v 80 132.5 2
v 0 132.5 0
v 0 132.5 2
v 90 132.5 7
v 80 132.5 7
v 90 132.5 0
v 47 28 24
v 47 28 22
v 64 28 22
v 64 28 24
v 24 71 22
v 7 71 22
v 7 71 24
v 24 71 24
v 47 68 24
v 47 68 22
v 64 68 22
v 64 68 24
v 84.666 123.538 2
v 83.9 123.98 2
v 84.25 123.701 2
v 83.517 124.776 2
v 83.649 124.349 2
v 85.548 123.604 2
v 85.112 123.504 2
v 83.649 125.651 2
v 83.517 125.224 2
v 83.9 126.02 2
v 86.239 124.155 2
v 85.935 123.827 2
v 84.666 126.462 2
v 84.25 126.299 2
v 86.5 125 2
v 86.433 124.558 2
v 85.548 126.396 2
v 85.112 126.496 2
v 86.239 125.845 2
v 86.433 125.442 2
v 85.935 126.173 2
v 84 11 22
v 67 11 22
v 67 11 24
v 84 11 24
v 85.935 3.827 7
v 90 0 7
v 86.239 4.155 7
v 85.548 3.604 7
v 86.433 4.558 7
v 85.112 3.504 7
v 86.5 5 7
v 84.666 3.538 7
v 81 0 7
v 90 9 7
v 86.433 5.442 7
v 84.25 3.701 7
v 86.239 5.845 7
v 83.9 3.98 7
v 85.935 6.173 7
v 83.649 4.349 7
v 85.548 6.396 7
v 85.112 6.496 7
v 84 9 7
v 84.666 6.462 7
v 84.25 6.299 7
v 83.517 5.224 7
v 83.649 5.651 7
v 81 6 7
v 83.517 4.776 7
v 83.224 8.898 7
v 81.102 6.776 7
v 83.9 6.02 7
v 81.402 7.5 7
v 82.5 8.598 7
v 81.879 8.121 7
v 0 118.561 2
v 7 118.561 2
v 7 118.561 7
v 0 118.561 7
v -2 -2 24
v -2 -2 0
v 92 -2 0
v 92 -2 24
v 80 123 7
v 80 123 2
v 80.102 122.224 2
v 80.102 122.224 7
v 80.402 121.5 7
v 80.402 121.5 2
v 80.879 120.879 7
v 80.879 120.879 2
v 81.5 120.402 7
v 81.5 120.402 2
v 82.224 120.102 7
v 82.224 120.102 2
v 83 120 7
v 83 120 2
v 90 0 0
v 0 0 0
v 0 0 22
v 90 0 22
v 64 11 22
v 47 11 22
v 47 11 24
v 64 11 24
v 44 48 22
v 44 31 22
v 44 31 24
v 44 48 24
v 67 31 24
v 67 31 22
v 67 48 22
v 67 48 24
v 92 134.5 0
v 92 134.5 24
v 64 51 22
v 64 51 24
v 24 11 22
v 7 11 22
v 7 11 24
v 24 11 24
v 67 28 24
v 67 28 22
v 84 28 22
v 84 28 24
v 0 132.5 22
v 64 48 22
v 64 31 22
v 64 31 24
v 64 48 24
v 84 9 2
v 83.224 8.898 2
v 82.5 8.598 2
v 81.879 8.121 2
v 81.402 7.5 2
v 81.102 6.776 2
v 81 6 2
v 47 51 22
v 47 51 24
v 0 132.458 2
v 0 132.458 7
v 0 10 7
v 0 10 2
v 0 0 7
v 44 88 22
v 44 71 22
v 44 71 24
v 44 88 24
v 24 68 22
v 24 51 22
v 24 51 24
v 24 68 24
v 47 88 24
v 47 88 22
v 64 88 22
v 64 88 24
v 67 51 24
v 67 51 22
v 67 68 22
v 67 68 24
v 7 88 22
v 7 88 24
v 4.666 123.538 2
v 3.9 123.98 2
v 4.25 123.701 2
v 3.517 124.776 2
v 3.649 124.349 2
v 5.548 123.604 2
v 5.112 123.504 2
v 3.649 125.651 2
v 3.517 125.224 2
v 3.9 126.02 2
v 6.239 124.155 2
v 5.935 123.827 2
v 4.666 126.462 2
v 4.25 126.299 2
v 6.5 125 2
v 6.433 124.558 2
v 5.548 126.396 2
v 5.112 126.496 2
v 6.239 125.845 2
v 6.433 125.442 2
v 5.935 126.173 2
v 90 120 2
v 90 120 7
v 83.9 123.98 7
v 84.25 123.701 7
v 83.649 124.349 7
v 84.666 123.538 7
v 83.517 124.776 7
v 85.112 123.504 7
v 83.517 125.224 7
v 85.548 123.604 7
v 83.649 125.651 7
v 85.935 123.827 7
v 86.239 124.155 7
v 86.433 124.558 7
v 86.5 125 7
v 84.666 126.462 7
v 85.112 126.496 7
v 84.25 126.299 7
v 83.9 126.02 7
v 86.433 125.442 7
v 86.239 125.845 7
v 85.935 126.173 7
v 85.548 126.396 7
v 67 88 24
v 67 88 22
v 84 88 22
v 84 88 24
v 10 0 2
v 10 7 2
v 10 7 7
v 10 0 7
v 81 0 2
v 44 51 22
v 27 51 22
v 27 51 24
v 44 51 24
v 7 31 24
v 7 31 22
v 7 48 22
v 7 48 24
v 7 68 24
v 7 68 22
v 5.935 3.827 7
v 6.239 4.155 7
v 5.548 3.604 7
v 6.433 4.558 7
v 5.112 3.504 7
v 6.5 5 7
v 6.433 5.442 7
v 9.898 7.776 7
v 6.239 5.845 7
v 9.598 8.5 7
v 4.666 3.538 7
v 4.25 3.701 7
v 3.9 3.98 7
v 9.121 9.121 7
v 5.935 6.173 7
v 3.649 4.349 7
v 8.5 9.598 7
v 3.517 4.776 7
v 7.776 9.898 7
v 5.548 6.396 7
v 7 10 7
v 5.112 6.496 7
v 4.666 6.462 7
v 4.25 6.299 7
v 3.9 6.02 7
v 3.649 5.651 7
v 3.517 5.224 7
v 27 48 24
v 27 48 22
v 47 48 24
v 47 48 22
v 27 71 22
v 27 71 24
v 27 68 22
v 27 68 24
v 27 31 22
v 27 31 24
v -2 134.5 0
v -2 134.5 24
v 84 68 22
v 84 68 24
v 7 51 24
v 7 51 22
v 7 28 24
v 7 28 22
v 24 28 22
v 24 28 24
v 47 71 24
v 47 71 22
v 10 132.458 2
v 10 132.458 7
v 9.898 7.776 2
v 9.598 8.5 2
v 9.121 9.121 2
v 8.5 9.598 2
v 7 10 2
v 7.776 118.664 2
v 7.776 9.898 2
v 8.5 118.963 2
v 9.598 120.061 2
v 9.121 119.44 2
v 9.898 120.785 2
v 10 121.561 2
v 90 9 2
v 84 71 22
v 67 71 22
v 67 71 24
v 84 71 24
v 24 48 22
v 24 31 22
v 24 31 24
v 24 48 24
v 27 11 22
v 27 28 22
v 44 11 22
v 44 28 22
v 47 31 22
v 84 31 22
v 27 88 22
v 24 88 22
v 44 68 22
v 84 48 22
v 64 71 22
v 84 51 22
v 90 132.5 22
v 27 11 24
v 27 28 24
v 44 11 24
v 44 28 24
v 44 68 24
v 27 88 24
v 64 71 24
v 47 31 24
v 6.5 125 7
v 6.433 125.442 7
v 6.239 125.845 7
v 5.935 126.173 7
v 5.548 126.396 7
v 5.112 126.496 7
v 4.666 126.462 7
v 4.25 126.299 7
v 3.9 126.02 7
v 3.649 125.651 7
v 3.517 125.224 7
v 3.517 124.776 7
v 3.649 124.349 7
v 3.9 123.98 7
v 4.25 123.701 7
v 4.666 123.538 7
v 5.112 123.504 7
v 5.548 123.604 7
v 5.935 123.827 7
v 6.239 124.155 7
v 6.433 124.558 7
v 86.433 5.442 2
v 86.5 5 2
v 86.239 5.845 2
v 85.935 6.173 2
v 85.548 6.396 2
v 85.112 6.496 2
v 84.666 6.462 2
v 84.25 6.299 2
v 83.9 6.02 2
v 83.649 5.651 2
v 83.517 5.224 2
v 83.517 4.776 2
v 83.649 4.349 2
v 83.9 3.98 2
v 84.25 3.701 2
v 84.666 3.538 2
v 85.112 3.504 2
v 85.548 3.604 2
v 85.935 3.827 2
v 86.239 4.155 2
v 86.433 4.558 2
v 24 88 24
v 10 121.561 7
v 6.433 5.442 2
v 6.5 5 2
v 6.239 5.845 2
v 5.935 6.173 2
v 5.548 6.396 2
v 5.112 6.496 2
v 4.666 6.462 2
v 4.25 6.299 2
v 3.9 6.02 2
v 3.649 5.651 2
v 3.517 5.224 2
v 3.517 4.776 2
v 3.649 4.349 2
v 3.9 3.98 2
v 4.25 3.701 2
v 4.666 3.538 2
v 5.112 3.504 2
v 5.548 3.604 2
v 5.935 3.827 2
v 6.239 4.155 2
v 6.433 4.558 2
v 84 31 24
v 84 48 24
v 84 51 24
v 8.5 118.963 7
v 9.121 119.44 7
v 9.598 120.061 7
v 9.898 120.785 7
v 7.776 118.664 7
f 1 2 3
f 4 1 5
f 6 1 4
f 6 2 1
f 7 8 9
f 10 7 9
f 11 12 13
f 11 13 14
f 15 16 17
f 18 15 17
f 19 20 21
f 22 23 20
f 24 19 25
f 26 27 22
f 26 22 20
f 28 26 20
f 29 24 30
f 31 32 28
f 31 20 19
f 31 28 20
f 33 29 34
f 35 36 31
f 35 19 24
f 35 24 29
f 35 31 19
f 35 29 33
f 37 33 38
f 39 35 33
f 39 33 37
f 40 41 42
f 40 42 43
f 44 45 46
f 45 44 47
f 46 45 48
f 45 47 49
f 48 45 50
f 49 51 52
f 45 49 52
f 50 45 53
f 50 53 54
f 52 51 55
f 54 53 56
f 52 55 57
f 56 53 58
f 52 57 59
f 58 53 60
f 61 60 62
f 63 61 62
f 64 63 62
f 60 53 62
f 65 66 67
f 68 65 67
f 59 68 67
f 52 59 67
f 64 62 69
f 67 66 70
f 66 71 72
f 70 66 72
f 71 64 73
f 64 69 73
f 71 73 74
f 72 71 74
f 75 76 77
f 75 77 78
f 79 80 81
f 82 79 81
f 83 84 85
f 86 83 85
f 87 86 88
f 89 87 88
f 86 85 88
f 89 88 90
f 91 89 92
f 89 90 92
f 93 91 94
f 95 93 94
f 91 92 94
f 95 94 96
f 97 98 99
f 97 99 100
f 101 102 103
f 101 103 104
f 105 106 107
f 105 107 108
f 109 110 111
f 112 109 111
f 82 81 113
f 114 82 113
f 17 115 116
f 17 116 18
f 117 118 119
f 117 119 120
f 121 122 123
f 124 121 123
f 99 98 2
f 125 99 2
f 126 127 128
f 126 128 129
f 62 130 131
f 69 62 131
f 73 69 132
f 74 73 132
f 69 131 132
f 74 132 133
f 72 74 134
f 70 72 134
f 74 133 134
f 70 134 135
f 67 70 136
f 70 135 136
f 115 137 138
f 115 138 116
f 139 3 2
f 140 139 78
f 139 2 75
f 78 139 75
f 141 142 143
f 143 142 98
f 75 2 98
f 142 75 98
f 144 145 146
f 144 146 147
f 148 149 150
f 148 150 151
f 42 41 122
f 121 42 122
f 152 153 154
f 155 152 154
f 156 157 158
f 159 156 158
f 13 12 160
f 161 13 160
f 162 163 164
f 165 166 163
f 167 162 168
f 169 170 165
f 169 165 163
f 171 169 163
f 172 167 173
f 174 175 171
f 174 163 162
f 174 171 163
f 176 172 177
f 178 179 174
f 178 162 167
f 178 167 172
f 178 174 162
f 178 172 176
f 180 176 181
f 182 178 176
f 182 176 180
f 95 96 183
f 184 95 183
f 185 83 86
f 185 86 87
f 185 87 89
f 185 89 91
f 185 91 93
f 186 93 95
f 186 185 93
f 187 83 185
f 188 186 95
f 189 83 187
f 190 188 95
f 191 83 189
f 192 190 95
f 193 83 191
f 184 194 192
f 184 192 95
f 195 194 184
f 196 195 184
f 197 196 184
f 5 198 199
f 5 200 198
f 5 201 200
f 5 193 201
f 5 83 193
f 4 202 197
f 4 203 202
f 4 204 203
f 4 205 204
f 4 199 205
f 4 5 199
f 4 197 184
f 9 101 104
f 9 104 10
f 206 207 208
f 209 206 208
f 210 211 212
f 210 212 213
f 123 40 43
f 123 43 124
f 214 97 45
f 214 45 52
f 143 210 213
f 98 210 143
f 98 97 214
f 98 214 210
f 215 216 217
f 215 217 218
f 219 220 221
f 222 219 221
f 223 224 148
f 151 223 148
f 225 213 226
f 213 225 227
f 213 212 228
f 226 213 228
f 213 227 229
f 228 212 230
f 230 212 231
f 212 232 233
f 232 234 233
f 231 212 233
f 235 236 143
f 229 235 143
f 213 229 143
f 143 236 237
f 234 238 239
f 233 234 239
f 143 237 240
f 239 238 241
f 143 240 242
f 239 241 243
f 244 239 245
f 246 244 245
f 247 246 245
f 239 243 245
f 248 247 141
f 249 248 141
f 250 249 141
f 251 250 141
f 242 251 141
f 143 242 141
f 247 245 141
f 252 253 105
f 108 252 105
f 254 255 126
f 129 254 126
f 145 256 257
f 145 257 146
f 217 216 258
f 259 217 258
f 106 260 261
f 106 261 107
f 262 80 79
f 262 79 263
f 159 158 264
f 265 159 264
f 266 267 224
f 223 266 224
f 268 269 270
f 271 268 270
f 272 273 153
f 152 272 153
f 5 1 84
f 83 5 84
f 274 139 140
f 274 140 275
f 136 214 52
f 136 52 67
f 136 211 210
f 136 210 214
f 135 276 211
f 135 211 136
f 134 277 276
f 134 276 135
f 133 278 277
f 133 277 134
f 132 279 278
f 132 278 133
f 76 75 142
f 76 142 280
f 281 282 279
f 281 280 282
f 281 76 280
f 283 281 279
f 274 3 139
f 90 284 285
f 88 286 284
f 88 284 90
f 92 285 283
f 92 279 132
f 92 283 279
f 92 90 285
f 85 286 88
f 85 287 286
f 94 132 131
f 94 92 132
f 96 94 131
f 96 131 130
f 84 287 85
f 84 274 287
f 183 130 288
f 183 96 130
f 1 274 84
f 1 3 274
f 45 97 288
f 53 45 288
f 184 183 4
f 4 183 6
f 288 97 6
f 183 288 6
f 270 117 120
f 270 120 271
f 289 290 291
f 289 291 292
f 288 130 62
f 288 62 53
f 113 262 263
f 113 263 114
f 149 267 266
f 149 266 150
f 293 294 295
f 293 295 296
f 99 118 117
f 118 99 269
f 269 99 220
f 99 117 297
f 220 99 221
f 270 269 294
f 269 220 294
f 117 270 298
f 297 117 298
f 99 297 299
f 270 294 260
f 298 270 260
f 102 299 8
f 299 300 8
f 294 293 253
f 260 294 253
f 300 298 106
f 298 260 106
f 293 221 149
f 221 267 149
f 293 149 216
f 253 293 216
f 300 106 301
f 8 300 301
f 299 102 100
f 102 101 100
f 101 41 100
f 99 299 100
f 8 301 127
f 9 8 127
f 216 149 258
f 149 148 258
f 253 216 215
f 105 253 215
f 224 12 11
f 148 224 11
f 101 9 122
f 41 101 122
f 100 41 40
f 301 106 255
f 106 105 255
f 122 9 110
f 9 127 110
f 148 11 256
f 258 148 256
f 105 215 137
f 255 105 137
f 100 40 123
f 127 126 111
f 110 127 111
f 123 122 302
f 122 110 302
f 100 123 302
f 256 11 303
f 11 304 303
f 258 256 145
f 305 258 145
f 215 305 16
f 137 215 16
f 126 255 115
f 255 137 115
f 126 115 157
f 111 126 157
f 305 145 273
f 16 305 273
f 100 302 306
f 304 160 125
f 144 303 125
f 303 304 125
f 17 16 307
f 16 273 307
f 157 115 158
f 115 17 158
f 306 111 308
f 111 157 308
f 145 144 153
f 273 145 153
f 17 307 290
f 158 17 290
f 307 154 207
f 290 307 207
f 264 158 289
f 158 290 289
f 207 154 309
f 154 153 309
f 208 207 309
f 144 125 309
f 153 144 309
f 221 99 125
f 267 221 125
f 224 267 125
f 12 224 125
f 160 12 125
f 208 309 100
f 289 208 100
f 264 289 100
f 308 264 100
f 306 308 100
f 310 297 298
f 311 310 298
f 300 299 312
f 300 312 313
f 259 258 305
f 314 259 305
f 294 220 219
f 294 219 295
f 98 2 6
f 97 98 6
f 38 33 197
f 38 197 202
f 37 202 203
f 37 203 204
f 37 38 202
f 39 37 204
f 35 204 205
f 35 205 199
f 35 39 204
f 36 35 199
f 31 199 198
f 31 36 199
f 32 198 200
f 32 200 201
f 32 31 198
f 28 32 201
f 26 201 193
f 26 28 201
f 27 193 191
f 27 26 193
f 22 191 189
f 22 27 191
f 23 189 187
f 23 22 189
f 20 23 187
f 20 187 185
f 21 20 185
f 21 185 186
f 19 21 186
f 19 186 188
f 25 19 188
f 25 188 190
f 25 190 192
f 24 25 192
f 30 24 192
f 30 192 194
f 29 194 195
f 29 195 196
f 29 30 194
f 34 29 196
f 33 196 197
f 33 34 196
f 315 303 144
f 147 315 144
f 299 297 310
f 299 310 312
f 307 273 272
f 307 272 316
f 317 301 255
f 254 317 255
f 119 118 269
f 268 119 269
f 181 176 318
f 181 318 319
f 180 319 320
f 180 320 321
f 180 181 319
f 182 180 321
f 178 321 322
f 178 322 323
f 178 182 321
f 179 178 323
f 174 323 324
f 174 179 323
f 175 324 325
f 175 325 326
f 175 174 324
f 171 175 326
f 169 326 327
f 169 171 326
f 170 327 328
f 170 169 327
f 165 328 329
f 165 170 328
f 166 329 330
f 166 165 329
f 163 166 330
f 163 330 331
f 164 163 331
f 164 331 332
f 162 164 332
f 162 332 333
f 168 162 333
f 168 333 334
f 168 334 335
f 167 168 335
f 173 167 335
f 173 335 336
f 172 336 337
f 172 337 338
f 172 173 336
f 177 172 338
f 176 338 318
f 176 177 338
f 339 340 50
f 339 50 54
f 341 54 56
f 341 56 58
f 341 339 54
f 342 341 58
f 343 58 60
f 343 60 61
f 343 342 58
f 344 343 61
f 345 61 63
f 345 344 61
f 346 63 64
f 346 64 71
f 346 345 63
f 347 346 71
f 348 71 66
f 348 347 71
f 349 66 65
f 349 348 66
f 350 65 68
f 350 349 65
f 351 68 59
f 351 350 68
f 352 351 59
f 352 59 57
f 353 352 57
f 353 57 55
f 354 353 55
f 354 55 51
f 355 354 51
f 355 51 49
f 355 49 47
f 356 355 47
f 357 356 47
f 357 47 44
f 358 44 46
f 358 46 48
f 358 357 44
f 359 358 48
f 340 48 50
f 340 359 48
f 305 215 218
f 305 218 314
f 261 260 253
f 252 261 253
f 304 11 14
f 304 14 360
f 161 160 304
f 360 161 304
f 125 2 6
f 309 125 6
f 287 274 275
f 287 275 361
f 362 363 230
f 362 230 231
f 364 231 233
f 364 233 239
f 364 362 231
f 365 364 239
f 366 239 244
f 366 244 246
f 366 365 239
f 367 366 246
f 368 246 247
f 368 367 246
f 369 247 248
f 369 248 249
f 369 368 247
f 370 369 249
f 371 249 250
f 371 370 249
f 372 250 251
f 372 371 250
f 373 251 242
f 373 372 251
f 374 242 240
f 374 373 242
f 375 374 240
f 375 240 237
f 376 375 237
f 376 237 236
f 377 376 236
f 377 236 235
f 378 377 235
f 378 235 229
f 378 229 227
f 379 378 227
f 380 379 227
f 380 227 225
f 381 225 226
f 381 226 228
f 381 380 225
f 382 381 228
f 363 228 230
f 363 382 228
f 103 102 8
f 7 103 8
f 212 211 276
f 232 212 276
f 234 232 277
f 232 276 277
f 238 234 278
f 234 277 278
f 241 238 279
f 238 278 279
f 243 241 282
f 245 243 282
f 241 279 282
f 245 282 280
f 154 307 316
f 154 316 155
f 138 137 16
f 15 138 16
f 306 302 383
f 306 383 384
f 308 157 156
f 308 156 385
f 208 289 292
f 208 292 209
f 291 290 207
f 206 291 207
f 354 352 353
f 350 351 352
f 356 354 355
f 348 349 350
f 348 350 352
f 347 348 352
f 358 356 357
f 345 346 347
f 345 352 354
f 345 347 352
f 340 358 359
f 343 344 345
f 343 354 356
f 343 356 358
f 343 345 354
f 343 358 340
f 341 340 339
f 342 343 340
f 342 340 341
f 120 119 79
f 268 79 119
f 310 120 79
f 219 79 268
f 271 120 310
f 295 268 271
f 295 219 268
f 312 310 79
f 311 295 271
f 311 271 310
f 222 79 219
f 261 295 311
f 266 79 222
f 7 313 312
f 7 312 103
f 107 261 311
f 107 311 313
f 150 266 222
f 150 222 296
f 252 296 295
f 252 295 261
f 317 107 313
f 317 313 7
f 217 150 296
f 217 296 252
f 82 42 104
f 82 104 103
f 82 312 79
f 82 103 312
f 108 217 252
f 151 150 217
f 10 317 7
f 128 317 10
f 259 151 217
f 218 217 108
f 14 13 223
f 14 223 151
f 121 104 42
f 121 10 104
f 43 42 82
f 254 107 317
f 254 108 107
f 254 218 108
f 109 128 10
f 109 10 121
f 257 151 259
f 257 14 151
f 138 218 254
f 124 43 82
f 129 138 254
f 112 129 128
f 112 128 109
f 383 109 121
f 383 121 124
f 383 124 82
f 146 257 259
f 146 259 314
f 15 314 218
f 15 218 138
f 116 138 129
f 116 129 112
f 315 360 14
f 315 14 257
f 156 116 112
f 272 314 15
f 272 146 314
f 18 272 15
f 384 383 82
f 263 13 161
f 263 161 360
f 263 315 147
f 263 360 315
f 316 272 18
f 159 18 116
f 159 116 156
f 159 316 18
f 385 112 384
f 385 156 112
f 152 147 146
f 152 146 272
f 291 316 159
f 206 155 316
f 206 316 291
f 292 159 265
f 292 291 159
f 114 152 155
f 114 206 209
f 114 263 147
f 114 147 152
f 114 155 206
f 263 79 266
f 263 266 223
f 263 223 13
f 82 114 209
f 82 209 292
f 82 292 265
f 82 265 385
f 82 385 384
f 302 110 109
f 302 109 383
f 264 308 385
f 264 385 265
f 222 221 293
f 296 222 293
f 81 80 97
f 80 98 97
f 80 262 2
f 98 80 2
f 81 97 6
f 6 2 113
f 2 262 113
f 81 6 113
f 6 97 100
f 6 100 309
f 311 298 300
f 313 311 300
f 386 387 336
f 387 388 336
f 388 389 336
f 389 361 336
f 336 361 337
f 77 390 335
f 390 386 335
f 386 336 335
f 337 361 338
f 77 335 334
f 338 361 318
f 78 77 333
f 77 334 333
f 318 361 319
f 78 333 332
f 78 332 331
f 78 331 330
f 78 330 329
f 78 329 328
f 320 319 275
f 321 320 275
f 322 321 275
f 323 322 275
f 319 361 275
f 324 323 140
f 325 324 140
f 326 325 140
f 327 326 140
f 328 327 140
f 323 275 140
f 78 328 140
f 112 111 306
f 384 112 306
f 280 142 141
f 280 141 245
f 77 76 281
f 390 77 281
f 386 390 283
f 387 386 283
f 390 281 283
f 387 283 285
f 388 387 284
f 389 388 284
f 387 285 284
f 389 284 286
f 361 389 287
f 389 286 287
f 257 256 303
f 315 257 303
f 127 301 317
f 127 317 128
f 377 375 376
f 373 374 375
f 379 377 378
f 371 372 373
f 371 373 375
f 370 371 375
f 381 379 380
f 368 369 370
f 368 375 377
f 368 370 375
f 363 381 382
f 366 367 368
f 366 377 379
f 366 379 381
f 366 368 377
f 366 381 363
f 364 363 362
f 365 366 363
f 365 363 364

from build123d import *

# Parameters (mm, degrees)
SKETCH003_W   = 90
SKETCH003_H   = 132.5
PAD_DEPTH     = 2
SKETCH005_R   = 1.5
PAD001_DEPTH  = 5
SKETCH006_W   = 17
SKETCH006_H   = 17
PAD005_DEPTH  = 40
ARRAY_X_COUNT = 4
ARRAY_X_PITCH = 20
ARRAY_Y_COUNT = 4
ARRAY_Y_PITCH = 20
SKETCH_W      = 94
SKETCH_H      = 136.5
SKETCH_W_2    = 90
SKETCH_H_2    = 132.5
PAD004_DEPTH  = 22
SKETCH001_W   = 94
SKETCH001_H   = 136.5
PAD003_DEPTH  = 2
POCKET_DEPTH  = 2


with BuildPart() as base:
    # Sketch003 → Pad (new body)
    with BuildSketch(Plane.XY):
        with Locations((45, 66.25)):
            Rectangle(SKETCH003_W, SKETCH003_H)
    extrude(amount=PAD_DEPTH)


with BuildPart() as fusion:
    # Pad001 base: copy of Base
    add(base.part)

    # Sketch005 → Pad001 (new body)
    with BuildSketch(Plane.XY.offset(2)):
        with BuildLine():
            Line((0, 10), (7, 10))
            ThreePointArc((10, 7), (9.12132, 9.12132), (7, 10))
            Line((10, 7), (10, 0))
            Line((10, 0), (0, 0))
            Line((0, 10), (0, 0))
        make_face()
        with Locations((5, 5)):
            Circle(SKETCH005_R, mode=Mode.SUBTRACT)
        with BuildLine():
            Line((84, 9), (90, 9))
            Line((90, 9), (90, 0))
            Line((90, 0), (81, 0))
            Line((81, 0), (81, 6))
            ThreePointArc((84, 9), (81.87868, 8.12132), (81, 6))
        make_face()
        with Locations((85, 5)):
            Circle(SKETCH005_R, mode=Mode.SUBTRACT)
        with BuildLine():
            Line((83, 120), (90, 120))
            Line((90, 120), (90, 132.5))
            Line((90, 132.5), (80, 132.5))
            Line((80, 132.5), (80, 123))
            ThreePointArc((80, 123), (80.87868, 120.87868), (83, 120))
        make_face()
        with Locations((85, 125)):
            Circle(SKETCH005_R, mode=Mode.SUBTRACT)
        with BuildLine():
            Line((7, 118.561478), (0, 118.561478))
            Line((0, 118.561478), (0, 132.457657))
            Line((0, 132.457657), (10, 132.457657))
            Line((10, 132.457657), (10, 121.561478))
            ThreePointArc((7, 118.561478), (9.12132, 119.440158), (10, 121.561478))
        make_face()
        with Locations((5, 125)):
            Circle(SKETCH005_R, mode=Mode.SUBTRACT)
    extrude(amount=PAD001_DEPTH)

    # Fusion: union Base
    add(base.part)


with BuildPart() as array:
    # Sketch006 → Pad005 (new body)
    with BuildSketch(Plane.XY):
        with Locations((15.5, 19.5)):
            Rectangle(SKETCH006_W, SKETCH006_H)
    extrude(amount=PAD005_DEPTH)

    # Array X: Array ×4


with BuildPart() as array_1:
    add(array.part)
    with Locations(*[(i * ARRAY_X_PITCH, 0, 0) for i in range(1, ARRAY_X_COUNT)]):
        add(array.part)

    # Array Y: Array ×4


with BuildPart() as array_2:
    add(array_1.part)
    with Locations(*[(0, i * ARRAY_Y_PITCH, 0) for i in range(1, ARRAY_Y_COUNT)]):
        add(array_1.part)


with BuildPart() as pad004:
    # Sketch → Pad004 (new body)
    with BuildSketch(Plane.XY):
        with Locations((45, 66.25)):
            Rectangle(SKETCH_W, SKETCH_H)
        with Locations((45, 66.25)):
            Rectangle(SKETCH_W_2, SKETCH_H_2, mode=Mode.SUBTRACT)
    extrude(amount=PAD004_DEPTH)


with BuildPart() as cut:
    # Pad003 base: copy of Pad004
    add(pad004.part)

    # Sketch001 → Pad003 (new body)
    with BuildSketch(Plane.XY.offset(22)):
        with Locations((45, 66.25)):
            Rectangle(SKETCH001_W, SKETCH001_H)
    extrude(amount=PAD003_DEPTH)

    # Fusion001: union Pad004
    add(pad004.part)

    # Cut: cut Array
    add(array_2.part, mode=Mode.SUBTRACT)


with BuildPart() as pocket:
    # Pocket base: copy of Cut
    add(cut.part)

    # Sketch007 → Pocket (cut)
    with BuildSketch(Plane(origin=(0, 134.5, 0), x_dir=(-1, 0, 0), z_dir=(0, 1, 0))):
        with BuildLine():
            ThreePointArc((-48, 13.721389), (-50, 11.721389), (-48, 9.721389))
            Line((-48, 9.721389), (-43, 9.721389))
            ThreePointArc((-43, 9.721389), (-41, 11.721389), (-43, 13.721389))
            Line((-48, 13.721389), (-43, 13.721389))
        make_face()
    extrude(amount=-POCKET_DEPTH, mode=Mode.SUBTRACT)


with BuildPart() as fusion002:
    # Fusion002 base: copy of Cut
    add(cut.part)

    # Fusion002: union Pocket
    add(pocket.part)


solid = Compound([fusion.part, fusion002.part])
